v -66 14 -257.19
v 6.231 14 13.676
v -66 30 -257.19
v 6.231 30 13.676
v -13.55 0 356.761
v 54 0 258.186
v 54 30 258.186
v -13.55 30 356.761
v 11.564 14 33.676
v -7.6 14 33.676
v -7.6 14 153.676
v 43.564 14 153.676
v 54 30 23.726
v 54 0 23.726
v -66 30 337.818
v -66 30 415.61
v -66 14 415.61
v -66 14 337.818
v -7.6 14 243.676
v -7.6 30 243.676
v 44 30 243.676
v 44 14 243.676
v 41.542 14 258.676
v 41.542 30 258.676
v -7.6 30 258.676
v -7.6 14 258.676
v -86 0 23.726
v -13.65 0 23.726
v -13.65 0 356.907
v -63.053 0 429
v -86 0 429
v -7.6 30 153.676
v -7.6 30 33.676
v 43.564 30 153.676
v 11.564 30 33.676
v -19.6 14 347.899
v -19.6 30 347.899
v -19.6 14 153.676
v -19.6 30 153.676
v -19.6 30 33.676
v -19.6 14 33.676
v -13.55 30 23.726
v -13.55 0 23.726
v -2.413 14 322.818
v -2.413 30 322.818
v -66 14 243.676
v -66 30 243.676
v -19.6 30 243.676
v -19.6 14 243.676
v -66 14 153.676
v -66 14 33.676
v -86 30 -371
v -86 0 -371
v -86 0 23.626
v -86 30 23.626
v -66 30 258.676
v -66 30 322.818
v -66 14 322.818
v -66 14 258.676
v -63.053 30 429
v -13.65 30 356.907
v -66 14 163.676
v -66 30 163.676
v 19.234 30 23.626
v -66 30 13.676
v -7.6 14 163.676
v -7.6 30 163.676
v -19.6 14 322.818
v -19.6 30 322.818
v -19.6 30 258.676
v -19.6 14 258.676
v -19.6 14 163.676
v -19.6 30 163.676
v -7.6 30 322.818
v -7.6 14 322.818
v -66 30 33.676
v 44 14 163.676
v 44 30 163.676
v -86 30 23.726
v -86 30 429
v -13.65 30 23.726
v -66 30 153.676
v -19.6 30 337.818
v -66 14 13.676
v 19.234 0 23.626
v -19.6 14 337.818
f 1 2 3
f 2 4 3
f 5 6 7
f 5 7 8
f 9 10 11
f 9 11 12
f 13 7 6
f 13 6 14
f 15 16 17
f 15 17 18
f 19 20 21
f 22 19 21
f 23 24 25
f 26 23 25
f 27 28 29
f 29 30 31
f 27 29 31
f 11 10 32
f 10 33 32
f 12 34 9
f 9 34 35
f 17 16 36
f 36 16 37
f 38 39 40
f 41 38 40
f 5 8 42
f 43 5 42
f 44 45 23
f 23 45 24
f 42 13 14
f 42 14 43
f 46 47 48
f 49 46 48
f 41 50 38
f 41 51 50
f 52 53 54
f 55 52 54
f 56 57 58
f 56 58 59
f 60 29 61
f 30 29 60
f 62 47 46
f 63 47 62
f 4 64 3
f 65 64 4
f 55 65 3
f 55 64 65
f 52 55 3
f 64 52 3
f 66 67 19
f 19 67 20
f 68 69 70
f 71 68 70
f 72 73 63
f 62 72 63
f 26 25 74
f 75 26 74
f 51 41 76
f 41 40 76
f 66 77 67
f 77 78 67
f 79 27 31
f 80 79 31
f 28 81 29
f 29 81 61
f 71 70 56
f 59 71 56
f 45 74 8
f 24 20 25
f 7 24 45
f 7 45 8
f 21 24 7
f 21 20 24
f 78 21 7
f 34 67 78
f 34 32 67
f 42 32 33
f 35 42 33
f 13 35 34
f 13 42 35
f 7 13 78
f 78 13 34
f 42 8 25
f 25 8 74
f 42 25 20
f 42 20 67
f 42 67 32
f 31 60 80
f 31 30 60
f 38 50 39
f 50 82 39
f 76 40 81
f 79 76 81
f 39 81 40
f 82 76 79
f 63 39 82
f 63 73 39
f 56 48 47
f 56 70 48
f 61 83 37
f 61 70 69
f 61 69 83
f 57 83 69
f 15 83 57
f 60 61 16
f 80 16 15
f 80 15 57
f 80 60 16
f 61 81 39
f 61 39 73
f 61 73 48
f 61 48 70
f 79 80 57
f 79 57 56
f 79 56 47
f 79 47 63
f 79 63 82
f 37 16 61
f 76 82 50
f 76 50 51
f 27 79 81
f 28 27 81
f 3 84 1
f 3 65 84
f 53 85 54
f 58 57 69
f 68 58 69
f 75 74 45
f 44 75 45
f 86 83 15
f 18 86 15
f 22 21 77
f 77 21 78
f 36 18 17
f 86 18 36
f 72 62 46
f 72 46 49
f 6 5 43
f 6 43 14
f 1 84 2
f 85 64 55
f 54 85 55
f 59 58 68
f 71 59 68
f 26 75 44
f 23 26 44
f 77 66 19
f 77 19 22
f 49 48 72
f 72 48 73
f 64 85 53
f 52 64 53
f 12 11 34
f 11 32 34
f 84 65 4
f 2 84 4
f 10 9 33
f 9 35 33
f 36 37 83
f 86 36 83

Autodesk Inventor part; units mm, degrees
ref_plane "YZ Plane" through (0, 0, 0) normal (1, 0, 0) x (0, 1, 0)
ref_plane "XZ Plane" through (0, 0, 0) normal (0, 1, 0) x (-1, 0, 0)
ref_plane "XY Plane" through (0, 0, 0) normal (0, 0, 1) x (1, 0, 0)
sketch "Sketch1" plane through (0, 0, 0) normal (0, 1, 0) x (-1, 0, 0)
  line L0 (86, 229) -> (-74, 229)
  line L1 (-74, 229) -> (-74, -371)
  line L2 (-74, -371) -> (86, -371)
  line L3 (86, -371) -> (86, 229)
  line L4 (86, 229) -> (-74, 229)
  line L5 (-74, 229) -> (-74, 429)
  line L6 (-74, 429) -> (86, 429)
  line L7 (86, 429) -> (86, 229)
  line L8 (-74, 229) -> (86, -371)
  line L9 (-74, 229) -> (63.0532, 429)
  line L10 (-74, 429) -> (-54, 429)
  line L11 (-54, 429) -> (-54, -371)
  line L12 (-54, -371) -> (-74, -371)
  line L13 (-74, -371) -> (-74, 429)
  point P0 (0, 0)
  point P1 (-54, 258.1857)
  point P2 (-54, 154)
  dimension "d0" = 600
  dimension "d1" = 200
  dimension "d2" = 160
  dimension "d3" = 20
extrude "Extrusion1" add sketch "Sketch1" along normal blind 30 contours L3 L8 L11 L0 | L0 L11 L9 L6 L7
sketch "Sketch2" plane through (0, 30, 0) normal (0, 1, 0) x (1, 0, 0)
  line L0 (75.5798, -163.6757) -> (-122, -163.6757)
  line L1 (-122, -163.6757) -> (-122, -153.6757)
  line L2 (-122, -153.6757) -> (75.5798, -153.6757)
  line L3 (75.5798, -153.6757) -> (75.5798, -163.6757)
  line L4 (143.751, -33.6757) -> (-97.1737, -33.6757)
  line L5 (-97.1737, -33.6757) -> (-97.1737, -13.6757)
  line L6 (-97.1737, -13.6757) -> (143.751, -13.6757)
  line L7 (143.751, -13.6757) -> (143.751, -33.6757)
  line L8 (152.9485, -258.6757) -> (-87.9762, -258.6757)
  line L9 (-87.9762, -258.6757) -> (-87.9762, -243.6757)
  line L10 (-87.9762, -243.6757) -> (152.9485, -243.6757)
  line L11 (152.9485, -243.6757) -> (152.9485, -258.6757)
  line L12 (-86, -429) -> (-63.0532, -429) projected
  line L13 (-63.0532, -429) -> (54, -258.1857) projected
  line L14 (54, -258.1857) -> (54, -154) projected
  line L15 (54, -154) -> (-86, 371) projected
  line L16 (-86, 371) -> (-86, -429) projected
  line L17 (-76, -419) -> (-68.3232, -419)
  line L18 (-68.3232, -419) -> (44, -255.0882)
  line L19 (44, -255.0882) -> (44, -155.3104)
  line L20 (44, -155.3104) -> (-76, 294.6896)
  line L21 (-76, 294.6896) -> (-76, -419)
  line L22 (38.103, -337.8179) -> (-236.6655, -337.8179)
  line L23 (-236.6655, -337.8179) -> (-236.6655, -322.8179)
  line L24 (-236.6655, -322.8179) -> (38.103, -322.8179)
  line L25 (38.103, -322.8179) -> (38.103, -337.8179)
  line L26 (-19.6002, -33.6757) -> (-7.6002, -33.6757)
  line L27 (-7.6002, -33.6757) -> (-7.6002, -433)
  line L28 (-7.6002, -433) -> (-19.6002, -433)
  line L29 (-19.6002, -433) -> (-19.6002, -33.6757)
  line L30 (-76, -419) -> (-66, -419)
  line L31 (-66, -419) -> (-66, 295.0501)
  line L32 (-66, 295.0501) -> (-76, 295.0501)
  line L33 (-76, 295.0501) -> (-76, -419)
  point P0 (0, 0)
  point P1 (-76, -13.6757)
  point P2 (6.2307, -13.6757)
  point P3 (-76, -33.6757)
  point P4 (-76, -153.6757)
  point P5 (44, -159.6038)
  point P6 (11.5641, -33.6757)
  point P7 (-76, -163.6757)
  point P8 (-76, -243.6757)
  point P9 (38.3772, -263.2935)
  point P10 (44, -163.6757)
  point P11 (41.5416, -258.6757)
  point P12 (-76, -258.6757)
  point P13 (-94.6892, -355.1147)
  point P14 (-104.6892, -352.0171)
  point P15 (43.5641, -153.6757)
  point P16 (44, -243.6757)
  point P17 (-86, -163.6757)
  point P18 (-86, -243.6757)
  point P19 (-86, -33.6757)
  point P20 (-86, -153.6757)
  point P21 (53.9135, -153.6757)
  point P22 (21.9135, -33.6757)
  point P23 (16.5802, -13.6757)
  point P24 (-86, -13.6757)
  point P25 (-86, -258.6757)
  point P26 (54, -163.6757)
  point P27 (-86, -337.8179)
  point P28 (-86, -322.8179)
  point P29 (54, -243.6757)
  point P30 (53.6642, -258.6757)
  point P31 (9.7098, -322.8179)
  point P32 (-0.5692, -337.8179)
  point P33 (-7.6002, -348.0781)
  point P34 (-19.6002, -365.5895)
  point P35 (-66, 257.1896)
  point P36 (-66, -13.6757)
  point P37 (-7.6002, -33.6757)
  point P38 (-7.6002, -153.6757)
  point P39 (-66, -33.6757)
  point P40 (-66, -153.6757)
  point P41 (-19.6002, -153.6757)
  point P42 (-66, -163.6757)
  point P43 (-66, -243.6757)
  point P44 (-19.6002, -243.6757)
  point P45 (-19.6002, -163.6757)
  point P46 (-7.6002, -163.6757)
  point P47 (-7.6002, -243.6757)
  point P48 (-7.6002, -258.6757)
  point P49 (-7.6002, -322.8179)
  point P50 (-2.4129, -322.8179)
  point P51 (-66, -258.6757)
  point P52 (-66, -322.8179)
  point P53 (-19.6002, -322.8179)
  point P54 (-19.6002, -258.6757)
  point P55 (-66, -337.8179)
  point P56 (-66, -415.6098)
  point P57 (-19.6002, -347.8991)
  point P58 (-19.6002, -337.8179)
  dimension "d6" = 10
  dimension "d7" = 20
  dimension "d8" = 15
  dimension "d9" = 120
  dimension "d10" = 80
  dimension "d11" = 10
  dimension "d15" = 15
  dimension "d16" = 12
  dimension "d17" = 20
extrude "Extrusion2" cut sketch "Sketch2" against normal blind 16 contours L19 L10 L27 L0 | L2 L27 L4 L20 | L29 L10 L31 L0 | L2 L31 L4 L29 | L8 L18 L24 L27 | L6 L31 L20 | L29 L24 L31 L8 | L29 L18 L31 L22
sketch "Sketch3" plane through (0, 30, 0) normal (0, 1, 0) x (1, 0, 0)
  line L0 (-7.6002, -33.6757) -> (11.5641, -33.6757) projected
  line L1 (6.2307, -13.6757) -> (-66, -13.6757) projected
  line L2 (30, -23.6257) -> (-105, -23.6257)
  line L3 (-105, -23.6257) -> (-105, -23.7257)
  line L4 (-105, -23.7257) -> (30, -23.7257)
  line L5 (30, -23.7257) -> (30, -23.6257)
  line L6 (-13.5502, -23.6945) -> (-13.6502, -23.6945)
  line L7 (-13.6502, -23.6945) -> (-13.6502, -433)
  line L8 (-13.6502, -433) -> (-13.5502, -433)
  line L9 (-13.5502, -433) -> (-13.5502, -23.6945)
  line L10 (-7.6002, -243.6757) -> (-7.6002, -163.6757) projected
  line L11 (-19.6002, -258.6757) -> (-19.6002, -322.8179) projected
  point P0 (0, 0)
  point P1 (-13.5502, -23.7257)
  point P2 (-13.6502, -23.7257)
  dimension "d18" = 20
  dimension "d19" = 9.95
  dimension "d20" = 9.95
  dimension "d21" = 5.95
  dimension "d22" = 5.95
extrude "Extrusion3" cut sketch "Sketch3" against normal blind 50
sketch "Sketch5" plane through (0, 30, 0) normal (0, 1, 0) x (1, 0, 0)
  line L0 (54, -154) -> (19.2602, -23.7257) projected
  line L1 (54, -154) -> (54, -23.7257)
  line L2 (54, -23.7257) -> (19.2602, -23.7257)
  line L3 (54, -258.1857) -> (54, -154) projected
  line L4 (19.2602, -23.7257) -> (54, -154)
  point P0 (0, 0)
extrude "Extrusion6" add sketch "Sketch5" against normal up to surface (30 mm away)
properties part number "Nozki" material "Aluminum 6061"
